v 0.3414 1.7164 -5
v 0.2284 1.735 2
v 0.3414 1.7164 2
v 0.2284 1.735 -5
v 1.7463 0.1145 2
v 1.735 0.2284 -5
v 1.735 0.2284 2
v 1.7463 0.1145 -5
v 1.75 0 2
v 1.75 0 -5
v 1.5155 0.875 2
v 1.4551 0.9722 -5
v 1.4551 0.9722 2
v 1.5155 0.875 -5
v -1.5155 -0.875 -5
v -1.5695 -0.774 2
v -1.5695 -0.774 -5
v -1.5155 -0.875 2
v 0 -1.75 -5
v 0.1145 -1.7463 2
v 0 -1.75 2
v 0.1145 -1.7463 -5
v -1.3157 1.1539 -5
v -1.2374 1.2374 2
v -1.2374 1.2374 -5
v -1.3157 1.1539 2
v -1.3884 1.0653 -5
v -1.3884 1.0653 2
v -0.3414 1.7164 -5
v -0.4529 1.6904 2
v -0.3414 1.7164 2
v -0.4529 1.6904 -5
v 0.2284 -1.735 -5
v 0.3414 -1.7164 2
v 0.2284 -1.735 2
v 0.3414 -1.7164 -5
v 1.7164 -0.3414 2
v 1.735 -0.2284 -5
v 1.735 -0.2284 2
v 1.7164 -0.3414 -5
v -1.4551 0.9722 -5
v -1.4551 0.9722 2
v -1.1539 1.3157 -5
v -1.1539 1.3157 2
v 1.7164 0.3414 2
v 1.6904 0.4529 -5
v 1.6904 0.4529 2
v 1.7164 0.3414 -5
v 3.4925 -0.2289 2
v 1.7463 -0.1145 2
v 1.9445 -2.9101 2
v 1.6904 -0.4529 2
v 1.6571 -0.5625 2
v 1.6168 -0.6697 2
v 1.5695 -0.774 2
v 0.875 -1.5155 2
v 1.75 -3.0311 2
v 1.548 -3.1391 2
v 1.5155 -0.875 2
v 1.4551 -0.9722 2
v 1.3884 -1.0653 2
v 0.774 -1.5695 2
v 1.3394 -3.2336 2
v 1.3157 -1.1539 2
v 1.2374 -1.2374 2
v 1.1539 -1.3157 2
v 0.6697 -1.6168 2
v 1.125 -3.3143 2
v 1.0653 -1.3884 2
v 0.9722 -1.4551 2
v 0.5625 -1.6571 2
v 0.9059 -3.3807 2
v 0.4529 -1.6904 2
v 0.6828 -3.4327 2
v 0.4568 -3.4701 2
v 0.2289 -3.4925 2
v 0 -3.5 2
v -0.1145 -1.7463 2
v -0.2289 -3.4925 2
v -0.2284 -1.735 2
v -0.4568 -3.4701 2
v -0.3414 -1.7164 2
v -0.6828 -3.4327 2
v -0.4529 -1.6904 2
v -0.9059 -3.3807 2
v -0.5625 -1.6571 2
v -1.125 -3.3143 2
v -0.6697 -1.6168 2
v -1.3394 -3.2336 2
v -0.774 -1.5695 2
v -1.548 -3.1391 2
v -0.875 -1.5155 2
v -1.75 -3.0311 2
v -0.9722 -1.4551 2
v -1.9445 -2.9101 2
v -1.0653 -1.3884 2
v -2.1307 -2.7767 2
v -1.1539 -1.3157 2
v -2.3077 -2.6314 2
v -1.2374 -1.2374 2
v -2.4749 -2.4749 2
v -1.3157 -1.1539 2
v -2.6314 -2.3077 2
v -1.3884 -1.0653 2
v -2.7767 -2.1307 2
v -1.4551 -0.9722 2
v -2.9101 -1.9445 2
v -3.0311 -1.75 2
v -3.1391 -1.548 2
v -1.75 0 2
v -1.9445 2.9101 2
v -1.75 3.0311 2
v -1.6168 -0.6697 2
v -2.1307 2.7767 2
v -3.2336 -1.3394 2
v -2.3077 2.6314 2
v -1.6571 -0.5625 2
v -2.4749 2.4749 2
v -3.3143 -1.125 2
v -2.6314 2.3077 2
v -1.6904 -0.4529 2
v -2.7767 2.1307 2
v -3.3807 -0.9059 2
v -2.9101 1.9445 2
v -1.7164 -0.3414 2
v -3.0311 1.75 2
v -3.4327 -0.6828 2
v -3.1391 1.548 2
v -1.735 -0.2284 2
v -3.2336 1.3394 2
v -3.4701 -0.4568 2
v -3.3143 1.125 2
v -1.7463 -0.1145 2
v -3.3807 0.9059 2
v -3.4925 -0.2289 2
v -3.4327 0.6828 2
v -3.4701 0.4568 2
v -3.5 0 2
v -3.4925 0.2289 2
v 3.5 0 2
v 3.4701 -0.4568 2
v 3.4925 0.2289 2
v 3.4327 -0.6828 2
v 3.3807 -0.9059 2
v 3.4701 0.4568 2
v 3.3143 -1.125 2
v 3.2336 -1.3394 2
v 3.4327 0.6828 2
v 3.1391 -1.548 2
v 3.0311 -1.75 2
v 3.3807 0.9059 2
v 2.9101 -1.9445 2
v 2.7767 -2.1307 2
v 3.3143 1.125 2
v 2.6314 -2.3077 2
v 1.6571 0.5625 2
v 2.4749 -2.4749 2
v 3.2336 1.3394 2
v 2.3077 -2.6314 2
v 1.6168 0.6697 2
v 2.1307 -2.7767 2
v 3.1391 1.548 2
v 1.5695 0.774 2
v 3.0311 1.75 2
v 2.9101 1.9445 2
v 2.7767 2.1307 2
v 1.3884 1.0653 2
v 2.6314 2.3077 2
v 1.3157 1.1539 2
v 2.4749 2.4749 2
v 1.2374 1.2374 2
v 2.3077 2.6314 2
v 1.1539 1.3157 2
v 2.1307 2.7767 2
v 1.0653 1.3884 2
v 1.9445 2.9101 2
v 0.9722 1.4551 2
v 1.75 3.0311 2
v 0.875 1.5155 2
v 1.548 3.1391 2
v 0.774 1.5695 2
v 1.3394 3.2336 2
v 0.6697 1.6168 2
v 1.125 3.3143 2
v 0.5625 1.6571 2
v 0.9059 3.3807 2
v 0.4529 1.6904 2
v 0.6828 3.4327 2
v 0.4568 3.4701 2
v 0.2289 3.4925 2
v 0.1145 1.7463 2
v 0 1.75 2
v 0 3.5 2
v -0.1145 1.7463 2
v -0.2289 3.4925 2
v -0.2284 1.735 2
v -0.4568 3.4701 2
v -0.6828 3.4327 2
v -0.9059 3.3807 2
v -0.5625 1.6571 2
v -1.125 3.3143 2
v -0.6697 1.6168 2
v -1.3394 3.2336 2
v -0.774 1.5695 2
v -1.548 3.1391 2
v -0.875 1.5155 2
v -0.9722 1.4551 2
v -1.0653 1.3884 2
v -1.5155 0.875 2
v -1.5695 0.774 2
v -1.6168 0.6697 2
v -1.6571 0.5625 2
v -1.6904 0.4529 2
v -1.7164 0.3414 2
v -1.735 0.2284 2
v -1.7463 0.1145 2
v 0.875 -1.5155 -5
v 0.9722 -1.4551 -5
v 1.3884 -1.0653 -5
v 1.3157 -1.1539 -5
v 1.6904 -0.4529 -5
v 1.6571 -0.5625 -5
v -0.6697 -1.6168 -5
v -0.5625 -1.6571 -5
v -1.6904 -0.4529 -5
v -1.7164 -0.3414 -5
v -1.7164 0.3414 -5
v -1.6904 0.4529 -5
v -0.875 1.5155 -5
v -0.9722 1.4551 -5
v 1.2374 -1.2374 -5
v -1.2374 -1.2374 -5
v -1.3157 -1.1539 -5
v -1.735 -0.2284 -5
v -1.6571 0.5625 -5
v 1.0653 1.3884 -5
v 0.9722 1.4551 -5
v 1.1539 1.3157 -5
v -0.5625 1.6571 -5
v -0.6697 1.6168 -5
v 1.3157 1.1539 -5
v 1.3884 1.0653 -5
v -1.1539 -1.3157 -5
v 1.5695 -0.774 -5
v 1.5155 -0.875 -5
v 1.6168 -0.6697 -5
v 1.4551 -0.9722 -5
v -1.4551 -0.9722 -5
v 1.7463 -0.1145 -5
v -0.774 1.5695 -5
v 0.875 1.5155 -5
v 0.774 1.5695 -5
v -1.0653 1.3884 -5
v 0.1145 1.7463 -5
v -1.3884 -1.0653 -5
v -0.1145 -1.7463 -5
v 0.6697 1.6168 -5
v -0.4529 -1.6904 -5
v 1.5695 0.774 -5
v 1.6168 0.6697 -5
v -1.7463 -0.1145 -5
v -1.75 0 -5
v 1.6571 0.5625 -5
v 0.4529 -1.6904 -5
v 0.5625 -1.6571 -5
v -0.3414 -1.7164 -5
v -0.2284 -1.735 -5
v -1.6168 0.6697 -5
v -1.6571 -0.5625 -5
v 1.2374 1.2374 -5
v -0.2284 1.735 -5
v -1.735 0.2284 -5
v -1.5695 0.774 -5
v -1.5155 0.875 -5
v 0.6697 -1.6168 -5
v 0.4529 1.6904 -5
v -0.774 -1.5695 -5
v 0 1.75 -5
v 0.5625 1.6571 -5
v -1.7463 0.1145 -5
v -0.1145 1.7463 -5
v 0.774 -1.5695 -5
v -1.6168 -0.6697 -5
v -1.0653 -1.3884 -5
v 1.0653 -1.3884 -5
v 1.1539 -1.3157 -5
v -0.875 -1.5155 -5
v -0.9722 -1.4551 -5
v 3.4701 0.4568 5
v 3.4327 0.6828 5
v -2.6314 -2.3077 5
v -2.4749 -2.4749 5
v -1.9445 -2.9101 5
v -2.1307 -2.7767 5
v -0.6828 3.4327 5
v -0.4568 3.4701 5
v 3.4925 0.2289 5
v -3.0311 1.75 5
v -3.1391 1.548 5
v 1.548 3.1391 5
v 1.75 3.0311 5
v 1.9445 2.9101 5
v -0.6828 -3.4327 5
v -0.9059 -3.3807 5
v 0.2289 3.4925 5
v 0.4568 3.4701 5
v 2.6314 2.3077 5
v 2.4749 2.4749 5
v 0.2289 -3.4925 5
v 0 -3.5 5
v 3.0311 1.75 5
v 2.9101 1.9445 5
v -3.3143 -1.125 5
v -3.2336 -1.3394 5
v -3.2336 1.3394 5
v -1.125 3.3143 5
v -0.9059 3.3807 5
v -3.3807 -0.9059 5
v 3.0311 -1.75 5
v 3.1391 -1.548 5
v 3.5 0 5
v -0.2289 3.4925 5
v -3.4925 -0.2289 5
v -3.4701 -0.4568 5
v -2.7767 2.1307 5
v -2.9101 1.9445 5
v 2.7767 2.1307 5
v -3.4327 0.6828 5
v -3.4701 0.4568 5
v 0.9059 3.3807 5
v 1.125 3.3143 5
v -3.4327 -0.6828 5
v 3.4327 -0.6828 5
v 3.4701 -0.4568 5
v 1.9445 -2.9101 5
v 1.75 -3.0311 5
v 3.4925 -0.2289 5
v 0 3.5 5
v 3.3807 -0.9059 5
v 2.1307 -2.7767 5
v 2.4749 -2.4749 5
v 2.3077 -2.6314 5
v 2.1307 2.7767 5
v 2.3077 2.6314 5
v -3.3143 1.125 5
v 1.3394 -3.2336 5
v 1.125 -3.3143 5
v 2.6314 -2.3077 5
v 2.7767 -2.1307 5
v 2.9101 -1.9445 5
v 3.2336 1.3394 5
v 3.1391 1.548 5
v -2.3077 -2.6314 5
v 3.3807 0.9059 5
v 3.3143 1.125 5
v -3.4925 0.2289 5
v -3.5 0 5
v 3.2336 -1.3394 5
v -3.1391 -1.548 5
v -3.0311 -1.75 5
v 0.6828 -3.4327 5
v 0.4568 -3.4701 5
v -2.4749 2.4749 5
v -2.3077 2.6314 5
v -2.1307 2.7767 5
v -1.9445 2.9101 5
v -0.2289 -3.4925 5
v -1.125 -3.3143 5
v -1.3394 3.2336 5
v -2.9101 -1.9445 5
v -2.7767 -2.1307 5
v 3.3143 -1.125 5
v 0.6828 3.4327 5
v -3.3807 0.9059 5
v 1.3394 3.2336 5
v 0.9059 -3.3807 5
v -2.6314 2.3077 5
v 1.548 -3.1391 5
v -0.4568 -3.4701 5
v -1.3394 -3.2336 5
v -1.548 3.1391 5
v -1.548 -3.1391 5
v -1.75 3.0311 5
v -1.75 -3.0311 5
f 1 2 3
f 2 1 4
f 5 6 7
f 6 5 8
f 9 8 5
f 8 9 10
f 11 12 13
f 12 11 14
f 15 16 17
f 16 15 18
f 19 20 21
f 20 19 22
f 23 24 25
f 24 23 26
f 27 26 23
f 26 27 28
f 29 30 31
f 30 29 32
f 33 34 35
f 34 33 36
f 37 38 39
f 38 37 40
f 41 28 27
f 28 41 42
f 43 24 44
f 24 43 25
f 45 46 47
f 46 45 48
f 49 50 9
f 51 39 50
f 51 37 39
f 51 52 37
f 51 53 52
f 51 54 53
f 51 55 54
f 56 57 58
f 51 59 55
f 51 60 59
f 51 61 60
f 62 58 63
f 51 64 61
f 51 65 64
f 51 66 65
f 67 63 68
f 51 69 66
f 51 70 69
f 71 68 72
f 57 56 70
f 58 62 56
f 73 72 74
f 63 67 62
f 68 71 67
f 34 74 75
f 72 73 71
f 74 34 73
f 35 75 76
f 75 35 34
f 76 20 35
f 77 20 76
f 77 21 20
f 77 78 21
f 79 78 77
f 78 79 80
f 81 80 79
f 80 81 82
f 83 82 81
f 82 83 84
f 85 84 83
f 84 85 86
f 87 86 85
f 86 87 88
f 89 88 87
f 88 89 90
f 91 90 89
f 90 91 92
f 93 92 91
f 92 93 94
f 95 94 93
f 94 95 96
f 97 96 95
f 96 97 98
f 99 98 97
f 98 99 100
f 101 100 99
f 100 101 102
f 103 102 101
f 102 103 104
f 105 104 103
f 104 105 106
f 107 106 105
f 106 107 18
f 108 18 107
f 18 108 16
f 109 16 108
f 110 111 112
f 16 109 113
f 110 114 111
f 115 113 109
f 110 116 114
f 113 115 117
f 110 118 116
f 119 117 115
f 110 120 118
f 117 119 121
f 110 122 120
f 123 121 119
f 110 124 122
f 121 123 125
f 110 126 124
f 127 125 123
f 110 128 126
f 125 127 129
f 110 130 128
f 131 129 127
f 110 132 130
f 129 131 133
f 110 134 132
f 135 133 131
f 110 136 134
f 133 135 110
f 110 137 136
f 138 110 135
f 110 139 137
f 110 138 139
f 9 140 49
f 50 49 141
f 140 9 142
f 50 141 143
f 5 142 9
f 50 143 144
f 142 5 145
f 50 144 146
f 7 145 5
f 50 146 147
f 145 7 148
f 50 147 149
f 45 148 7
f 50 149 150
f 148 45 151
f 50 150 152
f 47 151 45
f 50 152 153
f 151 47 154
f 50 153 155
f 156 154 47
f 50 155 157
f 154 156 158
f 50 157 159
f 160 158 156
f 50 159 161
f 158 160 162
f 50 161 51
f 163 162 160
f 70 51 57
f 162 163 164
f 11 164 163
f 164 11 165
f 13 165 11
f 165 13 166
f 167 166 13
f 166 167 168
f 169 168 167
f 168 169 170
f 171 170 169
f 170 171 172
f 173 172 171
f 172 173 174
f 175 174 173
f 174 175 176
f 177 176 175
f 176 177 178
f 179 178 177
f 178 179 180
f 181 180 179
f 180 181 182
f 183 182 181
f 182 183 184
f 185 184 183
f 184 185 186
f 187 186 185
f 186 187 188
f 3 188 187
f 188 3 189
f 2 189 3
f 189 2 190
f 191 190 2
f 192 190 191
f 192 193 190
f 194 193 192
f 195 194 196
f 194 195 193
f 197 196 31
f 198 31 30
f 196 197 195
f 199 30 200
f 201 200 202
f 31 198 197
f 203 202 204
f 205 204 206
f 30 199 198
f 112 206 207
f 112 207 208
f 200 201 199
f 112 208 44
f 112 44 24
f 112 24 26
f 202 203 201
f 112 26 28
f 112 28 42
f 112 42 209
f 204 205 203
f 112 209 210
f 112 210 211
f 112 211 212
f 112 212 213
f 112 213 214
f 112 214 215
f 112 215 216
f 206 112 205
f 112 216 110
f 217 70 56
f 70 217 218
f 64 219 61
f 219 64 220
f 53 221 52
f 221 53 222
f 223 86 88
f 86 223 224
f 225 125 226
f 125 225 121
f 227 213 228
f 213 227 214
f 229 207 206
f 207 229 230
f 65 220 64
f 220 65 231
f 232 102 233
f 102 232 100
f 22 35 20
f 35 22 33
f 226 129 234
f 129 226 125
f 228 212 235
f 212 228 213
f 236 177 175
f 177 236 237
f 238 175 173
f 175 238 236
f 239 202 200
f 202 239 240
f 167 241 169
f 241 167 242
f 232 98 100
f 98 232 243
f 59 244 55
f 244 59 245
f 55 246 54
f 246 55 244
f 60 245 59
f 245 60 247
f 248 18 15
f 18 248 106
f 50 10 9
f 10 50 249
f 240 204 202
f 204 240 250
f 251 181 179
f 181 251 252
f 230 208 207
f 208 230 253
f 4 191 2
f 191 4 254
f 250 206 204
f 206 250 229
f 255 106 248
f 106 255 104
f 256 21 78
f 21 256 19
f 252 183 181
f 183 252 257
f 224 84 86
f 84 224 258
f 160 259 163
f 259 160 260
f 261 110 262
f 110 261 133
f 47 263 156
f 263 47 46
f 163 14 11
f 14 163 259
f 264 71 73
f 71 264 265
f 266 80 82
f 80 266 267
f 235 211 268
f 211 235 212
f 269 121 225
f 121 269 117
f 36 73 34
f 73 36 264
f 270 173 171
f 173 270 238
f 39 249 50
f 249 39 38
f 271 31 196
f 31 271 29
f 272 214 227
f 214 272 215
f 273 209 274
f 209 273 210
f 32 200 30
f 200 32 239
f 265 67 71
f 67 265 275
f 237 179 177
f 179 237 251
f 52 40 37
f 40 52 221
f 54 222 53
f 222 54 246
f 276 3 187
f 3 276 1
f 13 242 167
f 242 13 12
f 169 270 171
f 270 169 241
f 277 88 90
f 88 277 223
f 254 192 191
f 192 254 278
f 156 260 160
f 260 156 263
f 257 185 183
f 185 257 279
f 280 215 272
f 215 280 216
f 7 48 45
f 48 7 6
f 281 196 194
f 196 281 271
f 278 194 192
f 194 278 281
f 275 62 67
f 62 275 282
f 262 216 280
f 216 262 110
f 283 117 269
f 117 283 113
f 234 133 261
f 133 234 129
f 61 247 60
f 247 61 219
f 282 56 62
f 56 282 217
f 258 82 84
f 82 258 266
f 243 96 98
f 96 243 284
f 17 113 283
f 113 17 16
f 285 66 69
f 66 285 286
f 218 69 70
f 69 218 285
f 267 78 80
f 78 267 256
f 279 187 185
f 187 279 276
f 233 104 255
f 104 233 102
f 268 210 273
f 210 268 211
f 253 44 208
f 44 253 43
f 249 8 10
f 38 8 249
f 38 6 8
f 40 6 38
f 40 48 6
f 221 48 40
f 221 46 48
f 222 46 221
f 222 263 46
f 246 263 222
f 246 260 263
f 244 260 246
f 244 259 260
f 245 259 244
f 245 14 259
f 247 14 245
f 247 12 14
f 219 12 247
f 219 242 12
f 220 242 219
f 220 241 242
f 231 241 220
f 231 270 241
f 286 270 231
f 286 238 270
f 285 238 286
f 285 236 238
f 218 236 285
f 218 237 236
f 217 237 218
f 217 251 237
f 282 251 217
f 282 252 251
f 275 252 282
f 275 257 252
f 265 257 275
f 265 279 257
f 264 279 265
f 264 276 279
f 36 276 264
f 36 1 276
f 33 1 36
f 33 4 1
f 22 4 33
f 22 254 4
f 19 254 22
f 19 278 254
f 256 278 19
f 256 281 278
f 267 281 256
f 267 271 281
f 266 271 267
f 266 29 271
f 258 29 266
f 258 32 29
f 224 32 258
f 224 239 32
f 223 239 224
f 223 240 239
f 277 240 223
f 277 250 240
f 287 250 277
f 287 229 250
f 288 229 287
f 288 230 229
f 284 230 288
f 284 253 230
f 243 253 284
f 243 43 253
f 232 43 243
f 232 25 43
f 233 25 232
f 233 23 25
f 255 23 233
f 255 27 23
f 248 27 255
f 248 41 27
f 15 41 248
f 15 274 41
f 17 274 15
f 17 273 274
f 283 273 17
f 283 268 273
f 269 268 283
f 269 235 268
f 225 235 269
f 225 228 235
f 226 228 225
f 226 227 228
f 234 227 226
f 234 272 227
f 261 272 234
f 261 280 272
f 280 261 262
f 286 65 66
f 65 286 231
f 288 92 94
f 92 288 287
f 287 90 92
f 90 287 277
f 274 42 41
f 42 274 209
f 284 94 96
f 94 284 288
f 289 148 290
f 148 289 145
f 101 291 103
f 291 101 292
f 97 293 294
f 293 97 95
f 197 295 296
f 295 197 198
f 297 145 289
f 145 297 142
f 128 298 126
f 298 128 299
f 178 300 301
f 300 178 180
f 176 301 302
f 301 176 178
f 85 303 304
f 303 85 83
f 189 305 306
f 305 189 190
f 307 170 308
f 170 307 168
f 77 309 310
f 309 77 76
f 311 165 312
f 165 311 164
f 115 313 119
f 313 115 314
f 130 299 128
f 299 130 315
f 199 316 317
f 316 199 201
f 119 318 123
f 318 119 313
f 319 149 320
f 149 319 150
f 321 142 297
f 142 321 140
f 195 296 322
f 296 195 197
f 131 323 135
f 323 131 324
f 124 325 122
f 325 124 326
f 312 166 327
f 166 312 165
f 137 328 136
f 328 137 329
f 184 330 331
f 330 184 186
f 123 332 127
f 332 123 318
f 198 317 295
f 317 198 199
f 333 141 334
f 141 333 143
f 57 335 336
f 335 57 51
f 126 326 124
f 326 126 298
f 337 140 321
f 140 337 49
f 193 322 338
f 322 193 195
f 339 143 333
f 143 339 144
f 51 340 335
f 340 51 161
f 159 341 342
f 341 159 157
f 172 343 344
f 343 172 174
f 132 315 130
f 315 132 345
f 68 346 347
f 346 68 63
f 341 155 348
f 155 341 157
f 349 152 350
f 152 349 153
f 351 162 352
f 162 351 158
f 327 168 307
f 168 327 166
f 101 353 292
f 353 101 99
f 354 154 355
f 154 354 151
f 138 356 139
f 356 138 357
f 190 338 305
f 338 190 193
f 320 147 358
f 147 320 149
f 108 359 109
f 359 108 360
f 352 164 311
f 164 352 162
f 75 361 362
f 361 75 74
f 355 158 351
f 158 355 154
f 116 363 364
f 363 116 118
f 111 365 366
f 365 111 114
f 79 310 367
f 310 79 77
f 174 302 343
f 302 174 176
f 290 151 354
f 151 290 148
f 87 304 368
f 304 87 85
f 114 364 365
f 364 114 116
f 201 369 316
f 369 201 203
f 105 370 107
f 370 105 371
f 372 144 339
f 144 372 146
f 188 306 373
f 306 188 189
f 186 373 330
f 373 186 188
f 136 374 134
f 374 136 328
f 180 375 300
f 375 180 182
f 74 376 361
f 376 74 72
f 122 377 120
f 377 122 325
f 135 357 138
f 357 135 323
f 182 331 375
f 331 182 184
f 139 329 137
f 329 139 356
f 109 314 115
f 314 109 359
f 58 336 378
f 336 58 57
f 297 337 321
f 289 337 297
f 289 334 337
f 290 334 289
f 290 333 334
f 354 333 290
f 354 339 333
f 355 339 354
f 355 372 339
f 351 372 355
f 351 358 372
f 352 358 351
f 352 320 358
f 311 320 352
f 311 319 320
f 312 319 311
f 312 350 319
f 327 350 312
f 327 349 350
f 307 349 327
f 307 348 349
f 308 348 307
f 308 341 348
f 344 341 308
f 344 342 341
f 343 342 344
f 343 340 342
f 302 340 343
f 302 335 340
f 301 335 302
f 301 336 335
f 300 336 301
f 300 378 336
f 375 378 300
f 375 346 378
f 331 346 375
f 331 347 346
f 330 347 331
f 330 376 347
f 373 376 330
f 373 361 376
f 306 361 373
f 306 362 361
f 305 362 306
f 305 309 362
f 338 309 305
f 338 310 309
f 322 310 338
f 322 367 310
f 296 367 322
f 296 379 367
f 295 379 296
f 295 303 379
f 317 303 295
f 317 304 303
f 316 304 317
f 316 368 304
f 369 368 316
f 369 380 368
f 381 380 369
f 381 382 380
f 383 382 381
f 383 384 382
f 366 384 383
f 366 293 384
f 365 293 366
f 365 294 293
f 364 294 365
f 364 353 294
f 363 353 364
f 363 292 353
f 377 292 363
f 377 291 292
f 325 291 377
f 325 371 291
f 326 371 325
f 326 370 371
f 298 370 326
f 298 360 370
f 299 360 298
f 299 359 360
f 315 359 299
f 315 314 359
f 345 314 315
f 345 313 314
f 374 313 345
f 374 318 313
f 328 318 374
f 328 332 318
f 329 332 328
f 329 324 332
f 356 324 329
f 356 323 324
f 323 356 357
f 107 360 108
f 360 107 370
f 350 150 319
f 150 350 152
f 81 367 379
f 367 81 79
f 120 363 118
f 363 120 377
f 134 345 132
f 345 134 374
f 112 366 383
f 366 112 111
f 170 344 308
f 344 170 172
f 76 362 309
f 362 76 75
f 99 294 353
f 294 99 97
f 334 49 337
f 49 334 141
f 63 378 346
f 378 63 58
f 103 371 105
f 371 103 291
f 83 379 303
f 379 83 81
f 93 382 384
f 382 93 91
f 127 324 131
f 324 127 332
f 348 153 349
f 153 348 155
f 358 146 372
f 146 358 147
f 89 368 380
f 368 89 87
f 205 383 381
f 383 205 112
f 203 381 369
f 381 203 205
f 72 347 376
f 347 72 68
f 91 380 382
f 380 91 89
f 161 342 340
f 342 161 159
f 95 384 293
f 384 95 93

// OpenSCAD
$fn=96;

shaft_d = 3.5;
head_d = 7.0;
length = 10.0;

head_h = 3.0;
shaft_h = length - head_h;

module screw_shaft(d, h){
    cylinder(d=d, h=h, center=false);
}

module screw_head(d, h){
    cylinder(d=d, h=h, center=false);
}

union(){
    translate([0,0,-length/2])
        screw_shaft(shaft_d, shaft_h);
    translate([0,0,-length/2 + shaft_h])
        screw_head(head_d, head_h);
}
